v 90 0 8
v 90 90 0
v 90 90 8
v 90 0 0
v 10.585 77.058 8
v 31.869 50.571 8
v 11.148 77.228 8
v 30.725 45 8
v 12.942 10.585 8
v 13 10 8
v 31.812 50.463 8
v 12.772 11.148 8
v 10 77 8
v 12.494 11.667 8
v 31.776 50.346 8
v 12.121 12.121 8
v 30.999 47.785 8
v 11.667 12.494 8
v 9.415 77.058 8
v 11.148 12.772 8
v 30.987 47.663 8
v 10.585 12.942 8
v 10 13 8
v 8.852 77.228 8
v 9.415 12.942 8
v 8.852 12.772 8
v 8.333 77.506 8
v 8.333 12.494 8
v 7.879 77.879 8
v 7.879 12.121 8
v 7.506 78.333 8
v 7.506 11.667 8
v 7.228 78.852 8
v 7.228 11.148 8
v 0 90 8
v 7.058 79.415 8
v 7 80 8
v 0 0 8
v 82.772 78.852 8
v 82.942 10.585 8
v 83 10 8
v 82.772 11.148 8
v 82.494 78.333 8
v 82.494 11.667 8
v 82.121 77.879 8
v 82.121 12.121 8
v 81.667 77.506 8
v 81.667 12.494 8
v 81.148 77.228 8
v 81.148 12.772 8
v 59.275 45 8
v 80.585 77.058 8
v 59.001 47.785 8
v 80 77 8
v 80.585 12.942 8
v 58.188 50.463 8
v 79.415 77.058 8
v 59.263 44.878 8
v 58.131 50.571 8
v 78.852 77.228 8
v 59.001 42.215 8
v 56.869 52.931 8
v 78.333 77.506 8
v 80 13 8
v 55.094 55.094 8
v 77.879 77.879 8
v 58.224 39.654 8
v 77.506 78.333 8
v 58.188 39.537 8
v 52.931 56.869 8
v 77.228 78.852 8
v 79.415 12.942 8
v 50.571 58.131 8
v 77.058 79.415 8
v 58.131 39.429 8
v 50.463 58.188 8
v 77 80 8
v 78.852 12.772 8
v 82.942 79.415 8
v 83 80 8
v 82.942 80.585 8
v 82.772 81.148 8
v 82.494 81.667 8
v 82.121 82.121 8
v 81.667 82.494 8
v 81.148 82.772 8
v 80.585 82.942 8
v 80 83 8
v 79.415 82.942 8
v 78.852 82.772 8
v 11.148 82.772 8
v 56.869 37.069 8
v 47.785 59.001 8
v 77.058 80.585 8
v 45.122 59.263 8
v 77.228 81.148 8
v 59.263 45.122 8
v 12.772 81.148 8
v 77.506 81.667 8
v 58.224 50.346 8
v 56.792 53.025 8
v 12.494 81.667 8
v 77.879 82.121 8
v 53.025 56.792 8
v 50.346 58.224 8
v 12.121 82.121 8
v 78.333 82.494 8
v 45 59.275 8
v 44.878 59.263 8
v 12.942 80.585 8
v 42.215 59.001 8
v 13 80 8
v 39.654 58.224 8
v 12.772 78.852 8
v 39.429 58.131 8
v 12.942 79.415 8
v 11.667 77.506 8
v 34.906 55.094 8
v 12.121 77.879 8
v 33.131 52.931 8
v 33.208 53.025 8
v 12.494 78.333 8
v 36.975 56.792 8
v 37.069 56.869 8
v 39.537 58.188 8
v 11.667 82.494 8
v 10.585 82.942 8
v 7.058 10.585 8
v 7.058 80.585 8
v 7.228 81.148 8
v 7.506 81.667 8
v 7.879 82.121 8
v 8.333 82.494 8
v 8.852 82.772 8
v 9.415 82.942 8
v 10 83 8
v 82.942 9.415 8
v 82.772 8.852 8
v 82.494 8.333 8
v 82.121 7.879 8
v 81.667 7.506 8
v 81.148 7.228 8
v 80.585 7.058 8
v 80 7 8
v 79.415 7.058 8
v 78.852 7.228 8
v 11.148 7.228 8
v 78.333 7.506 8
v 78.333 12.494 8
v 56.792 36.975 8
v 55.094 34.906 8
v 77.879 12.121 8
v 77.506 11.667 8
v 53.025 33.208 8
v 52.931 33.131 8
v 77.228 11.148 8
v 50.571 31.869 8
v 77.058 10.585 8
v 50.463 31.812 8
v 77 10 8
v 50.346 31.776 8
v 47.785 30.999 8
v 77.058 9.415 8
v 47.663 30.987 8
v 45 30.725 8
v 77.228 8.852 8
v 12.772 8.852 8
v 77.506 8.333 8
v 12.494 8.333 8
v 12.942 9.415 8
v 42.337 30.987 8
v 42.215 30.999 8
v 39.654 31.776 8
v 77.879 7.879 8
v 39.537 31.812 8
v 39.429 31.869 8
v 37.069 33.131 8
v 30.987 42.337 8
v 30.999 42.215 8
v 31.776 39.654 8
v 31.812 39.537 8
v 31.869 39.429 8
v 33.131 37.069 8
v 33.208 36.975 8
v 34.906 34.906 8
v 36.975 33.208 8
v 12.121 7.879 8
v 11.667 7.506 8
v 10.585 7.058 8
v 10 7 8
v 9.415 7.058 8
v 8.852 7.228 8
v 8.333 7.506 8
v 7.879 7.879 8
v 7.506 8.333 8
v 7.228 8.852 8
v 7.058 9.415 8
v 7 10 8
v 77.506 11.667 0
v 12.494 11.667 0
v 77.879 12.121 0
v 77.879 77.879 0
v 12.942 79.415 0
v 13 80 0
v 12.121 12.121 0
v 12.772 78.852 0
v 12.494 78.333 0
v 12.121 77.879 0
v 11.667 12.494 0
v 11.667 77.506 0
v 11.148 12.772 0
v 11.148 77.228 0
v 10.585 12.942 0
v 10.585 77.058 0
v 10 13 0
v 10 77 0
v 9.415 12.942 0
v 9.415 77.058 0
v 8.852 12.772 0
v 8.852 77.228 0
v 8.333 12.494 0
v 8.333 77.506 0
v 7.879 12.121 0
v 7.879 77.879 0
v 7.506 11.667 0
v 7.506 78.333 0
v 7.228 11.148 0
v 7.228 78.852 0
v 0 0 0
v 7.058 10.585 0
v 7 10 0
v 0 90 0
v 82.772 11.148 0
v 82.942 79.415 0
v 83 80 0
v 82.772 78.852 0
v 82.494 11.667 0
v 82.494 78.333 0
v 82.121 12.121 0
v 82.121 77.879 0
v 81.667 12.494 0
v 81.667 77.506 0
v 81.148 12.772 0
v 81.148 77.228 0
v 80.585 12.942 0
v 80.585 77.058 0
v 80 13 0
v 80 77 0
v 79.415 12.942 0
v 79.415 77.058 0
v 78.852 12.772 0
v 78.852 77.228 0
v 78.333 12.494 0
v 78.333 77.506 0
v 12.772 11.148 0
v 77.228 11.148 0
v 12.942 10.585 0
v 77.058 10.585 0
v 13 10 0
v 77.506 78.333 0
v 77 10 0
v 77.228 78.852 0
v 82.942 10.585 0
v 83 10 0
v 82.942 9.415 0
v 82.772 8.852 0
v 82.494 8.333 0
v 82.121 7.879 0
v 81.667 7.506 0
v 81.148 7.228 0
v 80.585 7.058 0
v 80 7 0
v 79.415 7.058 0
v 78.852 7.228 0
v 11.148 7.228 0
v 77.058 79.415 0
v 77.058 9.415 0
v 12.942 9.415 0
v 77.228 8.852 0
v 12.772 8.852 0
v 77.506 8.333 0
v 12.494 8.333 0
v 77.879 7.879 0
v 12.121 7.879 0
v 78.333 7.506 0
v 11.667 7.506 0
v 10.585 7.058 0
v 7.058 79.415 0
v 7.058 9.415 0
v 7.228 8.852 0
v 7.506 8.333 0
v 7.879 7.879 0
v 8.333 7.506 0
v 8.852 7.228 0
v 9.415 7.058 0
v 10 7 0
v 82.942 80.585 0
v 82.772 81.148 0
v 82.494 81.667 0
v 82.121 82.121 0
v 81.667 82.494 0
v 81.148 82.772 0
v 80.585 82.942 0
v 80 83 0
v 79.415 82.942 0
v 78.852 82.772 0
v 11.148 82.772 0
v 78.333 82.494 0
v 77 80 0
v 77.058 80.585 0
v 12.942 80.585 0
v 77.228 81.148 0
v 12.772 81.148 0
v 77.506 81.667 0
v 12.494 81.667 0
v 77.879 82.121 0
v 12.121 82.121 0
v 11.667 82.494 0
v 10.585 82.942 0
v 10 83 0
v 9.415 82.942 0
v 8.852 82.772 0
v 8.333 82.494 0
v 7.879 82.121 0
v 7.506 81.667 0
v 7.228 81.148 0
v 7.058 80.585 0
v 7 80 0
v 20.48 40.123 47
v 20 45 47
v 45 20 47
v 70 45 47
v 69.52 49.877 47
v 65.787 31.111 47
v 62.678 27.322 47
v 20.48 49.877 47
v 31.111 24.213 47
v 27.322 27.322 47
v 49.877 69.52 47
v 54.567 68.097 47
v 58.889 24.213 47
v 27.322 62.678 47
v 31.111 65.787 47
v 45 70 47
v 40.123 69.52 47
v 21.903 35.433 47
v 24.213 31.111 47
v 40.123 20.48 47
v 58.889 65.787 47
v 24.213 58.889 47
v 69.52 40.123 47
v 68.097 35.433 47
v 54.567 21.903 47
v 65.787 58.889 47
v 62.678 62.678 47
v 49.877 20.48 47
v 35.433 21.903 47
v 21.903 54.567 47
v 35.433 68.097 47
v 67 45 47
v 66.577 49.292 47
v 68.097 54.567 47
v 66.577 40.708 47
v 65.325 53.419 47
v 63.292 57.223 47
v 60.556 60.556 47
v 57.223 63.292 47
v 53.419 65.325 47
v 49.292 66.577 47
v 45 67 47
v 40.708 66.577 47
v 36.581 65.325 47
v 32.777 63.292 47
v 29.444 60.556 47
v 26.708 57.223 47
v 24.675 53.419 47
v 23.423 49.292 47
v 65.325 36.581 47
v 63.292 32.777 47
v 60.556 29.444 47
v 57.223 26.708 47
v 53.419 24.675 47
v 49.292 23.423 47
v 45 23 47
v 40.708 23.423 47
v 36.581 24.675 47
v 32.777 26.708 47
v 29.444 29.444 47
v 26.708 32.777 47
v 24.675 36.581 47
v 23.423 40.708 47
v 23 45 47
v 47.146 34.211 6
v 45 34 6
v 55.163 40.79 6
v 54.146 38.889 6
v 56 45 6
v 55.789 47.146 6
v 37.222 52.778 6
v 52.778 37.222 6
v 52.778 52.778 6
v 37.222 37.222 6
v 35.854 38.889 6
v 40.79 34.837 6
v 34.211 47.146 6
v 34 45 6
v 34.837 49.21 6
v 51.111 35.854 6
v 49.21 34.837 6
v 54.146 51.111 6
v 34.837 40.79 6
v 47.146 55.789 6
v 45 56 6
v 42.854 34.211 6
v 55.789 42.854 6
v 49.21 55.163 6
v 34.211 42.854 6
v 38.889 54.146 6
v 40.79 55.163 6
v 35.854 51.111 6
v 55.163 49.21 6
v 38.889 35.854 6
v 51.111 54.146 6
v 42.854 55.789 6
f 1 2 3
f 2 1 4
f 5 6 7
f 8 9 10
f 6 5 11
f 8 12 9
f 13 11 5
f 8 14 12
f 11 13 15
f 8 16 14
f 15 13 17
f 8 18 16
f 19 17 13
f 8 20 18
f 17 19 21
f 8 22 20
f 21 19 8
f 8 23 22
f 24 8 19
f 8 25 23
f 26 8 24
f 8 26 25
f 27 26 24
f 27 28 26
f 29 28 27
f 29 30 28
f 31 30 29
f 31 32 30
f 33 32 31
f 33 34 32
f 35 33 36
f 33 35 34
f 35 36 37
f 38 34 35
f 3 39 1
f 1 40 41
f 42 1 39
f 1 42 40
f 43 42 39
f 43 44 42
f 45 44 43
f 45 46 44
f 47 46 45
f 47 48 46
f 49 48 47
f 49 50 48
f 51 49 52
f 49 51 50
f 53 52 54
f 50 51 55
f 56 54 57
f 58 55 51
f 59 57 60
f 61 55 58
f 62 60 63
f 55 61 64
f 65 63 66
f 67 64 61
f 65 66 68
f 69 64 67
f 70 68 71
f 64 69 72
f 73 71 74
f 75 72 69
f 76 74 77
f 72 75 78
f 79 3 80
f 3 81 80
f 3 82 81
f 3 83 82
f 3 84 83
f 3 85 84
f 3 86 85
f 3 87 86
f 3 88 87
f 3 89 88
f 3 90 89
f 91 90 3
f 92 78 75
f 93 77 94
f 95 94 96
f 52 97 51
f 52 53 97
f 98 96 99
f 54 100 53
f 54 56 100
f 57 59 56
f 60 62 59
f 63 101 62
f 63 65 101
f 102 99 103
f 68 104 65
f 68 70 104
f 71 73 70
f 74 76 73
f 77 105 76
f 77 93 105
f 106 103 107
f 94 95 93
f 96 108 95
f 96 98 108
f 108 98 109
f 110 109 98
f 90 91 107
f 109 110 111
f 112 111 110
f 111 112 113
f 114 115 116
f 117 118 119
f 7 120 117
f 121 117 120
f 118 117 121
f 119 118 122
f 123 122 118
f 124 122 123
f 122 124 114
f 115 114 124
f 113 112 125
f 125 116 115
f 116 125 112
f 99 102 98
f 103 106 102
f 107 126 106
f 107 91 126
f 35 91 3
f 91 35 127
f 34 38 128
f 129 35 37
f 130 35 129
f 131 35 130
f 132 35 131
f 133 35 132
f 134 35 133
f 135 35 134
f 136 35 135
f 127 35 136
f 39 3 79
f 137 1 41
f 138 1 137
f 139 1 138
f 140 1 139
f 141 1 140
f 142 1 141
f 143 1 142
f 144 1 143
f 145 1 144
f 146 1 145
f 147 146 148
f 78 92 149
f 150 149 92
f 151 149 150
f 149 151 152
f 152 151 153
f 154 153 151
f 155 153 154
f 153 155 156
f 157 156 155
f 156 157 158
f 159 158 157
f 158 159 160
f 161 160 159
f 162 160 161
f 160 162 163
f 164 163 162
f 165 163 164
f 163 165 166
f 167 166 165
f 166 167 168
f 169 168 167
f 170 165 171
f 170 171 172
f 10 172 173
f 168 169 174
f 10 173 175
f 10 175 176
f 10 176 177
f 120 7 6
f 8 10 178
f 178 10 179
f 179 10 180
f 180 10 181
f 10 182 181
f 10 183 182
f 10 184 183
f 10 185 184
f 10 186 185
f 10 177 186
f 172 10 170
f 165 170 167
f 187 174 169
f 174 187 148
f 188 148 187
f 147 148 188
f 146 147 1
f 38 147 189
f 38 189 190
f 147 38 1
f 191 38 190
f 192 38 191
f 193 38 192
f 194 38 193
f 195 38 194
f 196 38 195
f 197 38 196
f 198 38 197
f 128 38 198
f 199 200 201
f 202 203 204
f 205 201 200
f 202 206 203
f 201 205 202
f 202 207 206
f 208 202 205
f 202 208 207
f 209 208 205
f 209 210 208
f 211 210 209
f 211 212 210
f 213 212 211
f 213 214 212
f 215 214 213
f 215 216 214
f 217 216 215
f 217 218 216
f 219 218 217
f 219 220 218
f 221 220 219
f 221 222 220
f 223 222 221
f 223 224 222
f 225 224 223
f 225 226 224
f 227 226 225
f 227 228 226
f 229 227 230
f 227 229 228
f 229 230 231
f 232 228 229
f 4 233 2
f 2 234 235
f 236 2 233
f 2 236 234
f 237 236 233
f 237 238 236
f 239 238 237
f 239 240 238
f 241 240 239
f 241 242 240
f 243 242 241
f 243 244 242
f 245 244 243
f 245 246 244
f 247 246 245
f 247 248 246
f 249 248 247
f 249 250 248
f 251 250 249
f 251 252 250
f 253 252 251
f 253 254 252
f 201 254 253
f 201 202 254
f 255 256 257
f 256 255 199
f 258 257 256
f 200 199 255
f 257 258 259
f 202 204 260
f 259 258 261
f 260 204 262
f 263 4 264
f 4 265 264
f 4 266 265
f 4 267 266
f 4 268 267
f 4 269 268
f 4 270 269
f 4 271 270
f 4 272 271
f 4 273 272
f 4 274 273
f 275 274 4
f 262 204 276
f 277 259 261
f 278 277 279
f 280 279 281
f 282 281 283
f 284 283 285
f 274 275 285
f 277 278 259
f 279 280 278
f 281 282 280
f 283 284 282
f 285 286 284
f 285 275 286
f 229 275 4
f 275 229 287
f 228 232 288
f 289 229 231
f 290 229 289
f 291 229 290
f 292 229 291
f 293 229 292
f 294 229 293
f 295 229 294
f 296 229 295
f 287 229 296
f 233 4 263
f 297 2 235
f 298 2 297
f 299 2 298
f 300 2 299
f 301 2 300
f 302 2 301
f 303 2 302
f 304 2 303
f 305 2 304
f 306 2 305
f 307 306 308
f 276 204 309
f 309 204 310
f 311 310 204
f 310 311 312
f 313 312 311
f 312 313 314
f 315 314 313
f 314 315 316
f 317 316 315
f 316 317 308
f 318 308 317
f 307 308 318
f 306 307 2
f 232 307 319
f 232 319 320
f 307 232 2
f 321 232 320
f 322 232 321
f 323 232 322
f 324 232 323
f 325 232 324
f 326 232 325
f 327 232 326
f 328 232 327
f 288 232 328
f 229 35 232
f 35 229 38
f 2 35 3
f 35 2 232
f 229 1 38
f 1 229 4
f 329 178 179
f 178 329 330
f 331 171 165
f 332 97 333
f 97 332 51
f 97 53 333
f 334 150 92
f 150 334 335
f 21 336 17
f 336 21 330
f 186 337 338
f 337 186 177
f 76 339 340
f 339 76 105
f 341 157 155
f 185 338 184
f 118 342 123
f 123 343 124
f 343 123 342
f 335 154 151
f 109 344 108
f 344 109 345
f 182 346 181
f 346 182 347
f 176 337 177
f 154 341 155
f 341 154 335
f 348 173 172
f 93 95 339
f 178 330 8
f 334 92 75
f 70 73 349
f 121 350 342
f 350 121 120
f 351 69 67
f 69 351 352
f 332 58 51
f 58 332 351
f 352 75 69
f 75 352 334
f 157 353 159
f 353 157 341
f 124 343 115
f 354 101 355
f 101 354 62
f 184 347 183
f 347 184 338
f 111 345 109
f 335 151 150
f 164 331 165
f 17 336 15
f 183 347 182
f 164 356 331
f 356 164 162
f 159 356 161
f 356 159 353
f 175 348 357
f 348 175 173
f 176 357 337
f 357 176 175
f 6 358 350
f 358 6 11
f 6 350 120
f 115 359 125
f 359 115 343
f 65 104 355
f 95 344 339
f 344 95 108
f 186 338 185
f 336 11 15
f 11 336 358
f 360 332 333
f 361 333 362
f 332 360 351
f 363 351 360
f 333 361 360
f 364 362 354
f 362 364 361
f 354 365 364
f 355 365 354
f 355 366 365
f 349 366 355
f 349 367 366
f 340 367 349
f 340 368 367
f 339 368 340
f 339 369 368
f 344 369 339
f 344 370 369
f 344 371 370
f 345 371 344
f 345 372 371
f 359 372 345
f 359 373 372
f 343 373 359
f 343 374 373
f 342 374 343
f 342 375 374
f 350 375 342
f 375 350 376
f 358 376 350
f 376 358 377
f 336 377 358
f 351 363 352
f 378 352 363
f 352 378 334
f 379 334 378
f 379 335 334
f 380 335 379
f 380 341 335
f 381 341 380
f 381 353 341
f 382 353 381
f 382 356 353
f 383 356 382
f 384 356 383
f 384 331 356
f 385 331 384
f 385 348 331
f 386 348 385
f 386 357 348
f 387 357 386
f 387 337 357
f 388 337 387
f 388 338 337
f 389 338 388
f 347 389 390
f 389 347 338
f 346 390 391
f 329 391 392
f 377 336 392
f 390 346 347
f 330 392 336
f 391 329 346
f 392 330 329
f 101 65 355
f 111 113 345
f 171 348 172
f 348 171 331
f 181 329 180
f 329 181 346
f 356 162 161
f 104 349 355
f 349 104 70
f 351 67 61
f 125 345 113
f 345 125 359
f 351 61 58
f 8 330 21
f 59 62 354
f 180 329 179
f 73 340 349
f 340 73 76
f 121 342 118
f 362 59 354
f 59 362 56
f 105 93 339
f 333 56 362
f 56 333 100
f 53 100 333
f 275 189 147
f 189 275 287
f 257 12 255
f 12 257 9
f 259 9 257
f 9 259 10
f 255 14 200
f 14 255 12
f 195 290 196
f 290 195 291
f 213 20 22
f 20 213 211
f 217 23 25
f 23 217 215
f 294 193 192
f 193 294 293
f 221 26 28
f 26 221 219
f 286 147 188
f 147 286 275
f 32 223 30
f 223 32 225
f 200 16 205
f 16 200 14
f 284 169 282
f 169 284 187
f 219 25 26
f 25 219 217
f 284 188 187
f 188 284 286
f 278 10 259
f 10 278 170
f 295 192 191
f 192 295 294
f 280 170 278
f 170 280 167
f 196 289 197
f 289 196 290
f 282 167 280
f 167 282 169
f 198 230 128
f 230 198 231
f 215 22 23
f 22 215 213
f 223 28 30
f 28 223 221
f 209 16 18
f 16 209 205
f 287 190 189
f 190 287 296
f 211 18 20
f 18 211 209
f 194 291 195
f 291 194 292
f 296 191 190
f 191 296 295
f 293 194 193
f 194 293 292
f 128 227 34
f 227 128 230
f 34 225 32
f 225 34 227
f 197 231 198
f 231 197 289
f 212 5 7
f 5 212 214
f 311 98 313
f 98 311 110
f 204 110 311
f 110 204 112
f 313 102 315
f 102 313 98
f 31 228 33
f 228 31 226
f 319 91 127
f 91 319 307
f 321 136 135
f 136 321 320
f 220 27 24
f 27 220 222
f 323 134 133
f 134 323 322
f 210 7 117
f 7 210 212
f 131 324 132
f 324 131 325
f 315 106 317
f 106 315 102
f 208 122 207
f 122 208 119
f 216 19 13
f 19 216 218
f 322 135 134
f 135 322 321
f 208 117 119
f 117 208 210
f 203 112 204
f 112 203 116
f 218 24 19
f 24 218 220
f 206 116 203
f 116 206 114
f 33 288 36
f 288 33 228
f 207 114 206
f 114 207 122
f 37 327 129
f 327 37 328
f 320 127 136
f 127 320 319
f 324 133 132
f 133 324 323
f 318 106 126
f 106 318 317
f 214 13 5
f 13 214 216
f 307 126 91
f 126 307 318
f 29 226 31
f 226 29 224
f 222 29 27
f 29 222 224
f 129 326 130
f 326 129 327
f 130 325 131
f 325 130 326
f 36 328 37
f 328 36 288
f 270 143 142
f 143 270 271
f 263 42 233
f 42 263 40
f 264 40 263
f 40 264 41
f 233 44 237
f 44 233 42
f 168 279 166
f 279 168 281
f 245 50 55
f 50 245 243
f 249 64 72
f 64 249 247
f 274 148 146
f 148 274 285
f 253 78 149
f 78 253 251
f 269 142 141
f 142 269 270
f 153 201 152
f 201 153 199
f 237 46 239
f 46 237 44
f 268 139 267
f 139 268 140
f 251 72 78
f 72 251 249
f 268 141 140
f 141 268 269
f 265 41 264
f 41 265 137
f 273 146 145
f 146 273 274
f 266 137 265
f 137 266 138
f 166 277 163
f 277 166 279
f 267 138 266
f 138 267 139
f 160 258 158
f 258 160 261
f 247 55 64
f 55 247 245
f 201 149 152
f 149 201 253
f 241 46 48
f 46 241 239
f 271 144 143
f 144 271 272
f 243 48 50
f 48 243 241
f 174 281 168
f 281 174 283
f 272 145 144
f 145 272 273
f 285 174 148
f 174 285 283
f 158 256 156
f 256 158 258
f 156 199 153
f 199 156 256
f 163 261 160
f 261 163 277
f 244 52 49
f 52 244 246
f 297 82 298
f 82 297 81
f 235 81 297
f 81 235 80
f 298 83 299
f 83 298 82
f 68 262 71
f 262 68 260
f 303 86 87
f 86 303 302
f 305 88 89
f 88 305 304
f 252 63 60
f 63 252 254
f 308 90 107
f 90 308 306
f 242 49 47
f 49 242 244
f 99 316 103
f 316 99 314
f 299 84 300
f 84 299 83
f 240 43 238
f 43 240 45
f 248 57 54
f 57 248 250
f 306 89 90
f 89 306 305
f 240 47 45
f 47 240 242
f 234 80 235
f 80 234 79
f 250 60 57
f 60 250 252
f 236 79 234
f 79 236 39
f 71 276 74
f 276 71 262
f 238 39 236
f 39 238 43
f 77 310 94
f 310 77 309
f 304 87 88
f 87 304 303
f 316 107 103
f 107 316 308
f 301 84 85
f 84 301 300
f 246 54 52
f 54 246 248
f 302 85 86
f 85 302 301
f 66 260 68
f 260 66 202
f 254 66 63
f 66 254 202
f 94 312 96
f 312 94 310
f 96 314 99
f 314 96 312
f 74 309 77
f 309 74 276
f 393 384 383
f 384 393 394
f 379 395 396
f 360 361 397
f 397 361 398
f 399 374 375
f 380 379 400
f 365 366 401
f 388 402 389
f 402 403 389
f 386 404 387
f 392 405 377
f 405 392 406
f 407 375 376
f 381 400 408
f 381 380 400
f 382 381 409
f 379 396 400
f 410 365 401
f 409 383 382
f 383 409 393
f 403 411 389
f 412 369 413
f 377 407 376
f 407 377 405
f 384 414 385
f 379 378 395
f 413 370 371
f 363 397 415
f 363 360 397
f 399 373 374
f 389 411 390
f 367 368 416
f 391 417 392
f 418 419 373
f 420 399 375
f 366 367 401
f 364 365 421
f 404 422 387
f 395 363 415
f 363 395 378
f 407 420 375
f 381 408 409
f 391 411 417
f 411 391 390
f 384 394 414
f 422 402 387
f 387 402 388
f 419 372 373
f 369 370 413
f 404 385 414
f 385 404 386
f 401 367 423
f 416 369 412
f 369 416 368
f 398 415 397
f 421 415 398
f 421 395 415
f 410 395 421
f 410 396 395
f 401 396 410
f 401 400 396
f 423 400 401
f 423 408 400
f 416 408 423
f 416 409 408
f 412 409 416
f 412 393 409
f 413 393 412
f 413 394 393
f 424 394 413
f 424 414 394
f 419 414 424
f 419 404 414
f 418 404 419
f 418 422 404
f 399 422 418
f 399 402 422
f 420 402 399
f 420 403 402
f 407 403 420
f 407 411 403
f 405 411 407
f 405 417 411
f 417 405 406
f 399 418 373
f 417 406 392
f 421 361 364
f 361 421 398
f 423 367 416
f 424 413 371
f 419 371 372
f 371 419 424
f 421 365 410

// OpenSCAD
$fn = 32;

// ----------------------------------------------------------------------
// Hopper: flanged with square flange
// ----------------------------------------------------------------------

// --- parameters (mm) ---
fl = 90;                  // flange side, X and Y
fl_t = 8;                 // flange thickness
cone_h = 40;              // cone height above the flange
top_d = 50;               // cone mouth diameter
bot_d = 28;               // cone spout diameter
wall = 3;                 // cone wall thickness
hole_r = 3;               // flange hole radius
hole_in = 10;             // hole inset from the corners

bore_d = bot_d - 2 * wall;  // spout bore diameter
total_h = fl_t + cone_h - 1;  // overall height

difference() {
  union() {
    cube([fl, fl, fl_t]);
    translate([fl / 2, fl / 2, fl_t - 1])
      cylinder(h = cone_h, d1 = bot_d, d2 = top_d);
  }
  translate([fl / 2, fl / 2, fl_t - 2])
    cylinder(h = cone_h + 1, d1 = bore_d, d2 = top_d - 2 * wall);
  for (sx = [0, 1], sy = [0, 1])
    translate([sx ? fl - hole_in : hole_in,
               sy ? fl - hole_in : hole_in, -1])
      cylinder(r = hole_r, h = fl_t + 2);
}
